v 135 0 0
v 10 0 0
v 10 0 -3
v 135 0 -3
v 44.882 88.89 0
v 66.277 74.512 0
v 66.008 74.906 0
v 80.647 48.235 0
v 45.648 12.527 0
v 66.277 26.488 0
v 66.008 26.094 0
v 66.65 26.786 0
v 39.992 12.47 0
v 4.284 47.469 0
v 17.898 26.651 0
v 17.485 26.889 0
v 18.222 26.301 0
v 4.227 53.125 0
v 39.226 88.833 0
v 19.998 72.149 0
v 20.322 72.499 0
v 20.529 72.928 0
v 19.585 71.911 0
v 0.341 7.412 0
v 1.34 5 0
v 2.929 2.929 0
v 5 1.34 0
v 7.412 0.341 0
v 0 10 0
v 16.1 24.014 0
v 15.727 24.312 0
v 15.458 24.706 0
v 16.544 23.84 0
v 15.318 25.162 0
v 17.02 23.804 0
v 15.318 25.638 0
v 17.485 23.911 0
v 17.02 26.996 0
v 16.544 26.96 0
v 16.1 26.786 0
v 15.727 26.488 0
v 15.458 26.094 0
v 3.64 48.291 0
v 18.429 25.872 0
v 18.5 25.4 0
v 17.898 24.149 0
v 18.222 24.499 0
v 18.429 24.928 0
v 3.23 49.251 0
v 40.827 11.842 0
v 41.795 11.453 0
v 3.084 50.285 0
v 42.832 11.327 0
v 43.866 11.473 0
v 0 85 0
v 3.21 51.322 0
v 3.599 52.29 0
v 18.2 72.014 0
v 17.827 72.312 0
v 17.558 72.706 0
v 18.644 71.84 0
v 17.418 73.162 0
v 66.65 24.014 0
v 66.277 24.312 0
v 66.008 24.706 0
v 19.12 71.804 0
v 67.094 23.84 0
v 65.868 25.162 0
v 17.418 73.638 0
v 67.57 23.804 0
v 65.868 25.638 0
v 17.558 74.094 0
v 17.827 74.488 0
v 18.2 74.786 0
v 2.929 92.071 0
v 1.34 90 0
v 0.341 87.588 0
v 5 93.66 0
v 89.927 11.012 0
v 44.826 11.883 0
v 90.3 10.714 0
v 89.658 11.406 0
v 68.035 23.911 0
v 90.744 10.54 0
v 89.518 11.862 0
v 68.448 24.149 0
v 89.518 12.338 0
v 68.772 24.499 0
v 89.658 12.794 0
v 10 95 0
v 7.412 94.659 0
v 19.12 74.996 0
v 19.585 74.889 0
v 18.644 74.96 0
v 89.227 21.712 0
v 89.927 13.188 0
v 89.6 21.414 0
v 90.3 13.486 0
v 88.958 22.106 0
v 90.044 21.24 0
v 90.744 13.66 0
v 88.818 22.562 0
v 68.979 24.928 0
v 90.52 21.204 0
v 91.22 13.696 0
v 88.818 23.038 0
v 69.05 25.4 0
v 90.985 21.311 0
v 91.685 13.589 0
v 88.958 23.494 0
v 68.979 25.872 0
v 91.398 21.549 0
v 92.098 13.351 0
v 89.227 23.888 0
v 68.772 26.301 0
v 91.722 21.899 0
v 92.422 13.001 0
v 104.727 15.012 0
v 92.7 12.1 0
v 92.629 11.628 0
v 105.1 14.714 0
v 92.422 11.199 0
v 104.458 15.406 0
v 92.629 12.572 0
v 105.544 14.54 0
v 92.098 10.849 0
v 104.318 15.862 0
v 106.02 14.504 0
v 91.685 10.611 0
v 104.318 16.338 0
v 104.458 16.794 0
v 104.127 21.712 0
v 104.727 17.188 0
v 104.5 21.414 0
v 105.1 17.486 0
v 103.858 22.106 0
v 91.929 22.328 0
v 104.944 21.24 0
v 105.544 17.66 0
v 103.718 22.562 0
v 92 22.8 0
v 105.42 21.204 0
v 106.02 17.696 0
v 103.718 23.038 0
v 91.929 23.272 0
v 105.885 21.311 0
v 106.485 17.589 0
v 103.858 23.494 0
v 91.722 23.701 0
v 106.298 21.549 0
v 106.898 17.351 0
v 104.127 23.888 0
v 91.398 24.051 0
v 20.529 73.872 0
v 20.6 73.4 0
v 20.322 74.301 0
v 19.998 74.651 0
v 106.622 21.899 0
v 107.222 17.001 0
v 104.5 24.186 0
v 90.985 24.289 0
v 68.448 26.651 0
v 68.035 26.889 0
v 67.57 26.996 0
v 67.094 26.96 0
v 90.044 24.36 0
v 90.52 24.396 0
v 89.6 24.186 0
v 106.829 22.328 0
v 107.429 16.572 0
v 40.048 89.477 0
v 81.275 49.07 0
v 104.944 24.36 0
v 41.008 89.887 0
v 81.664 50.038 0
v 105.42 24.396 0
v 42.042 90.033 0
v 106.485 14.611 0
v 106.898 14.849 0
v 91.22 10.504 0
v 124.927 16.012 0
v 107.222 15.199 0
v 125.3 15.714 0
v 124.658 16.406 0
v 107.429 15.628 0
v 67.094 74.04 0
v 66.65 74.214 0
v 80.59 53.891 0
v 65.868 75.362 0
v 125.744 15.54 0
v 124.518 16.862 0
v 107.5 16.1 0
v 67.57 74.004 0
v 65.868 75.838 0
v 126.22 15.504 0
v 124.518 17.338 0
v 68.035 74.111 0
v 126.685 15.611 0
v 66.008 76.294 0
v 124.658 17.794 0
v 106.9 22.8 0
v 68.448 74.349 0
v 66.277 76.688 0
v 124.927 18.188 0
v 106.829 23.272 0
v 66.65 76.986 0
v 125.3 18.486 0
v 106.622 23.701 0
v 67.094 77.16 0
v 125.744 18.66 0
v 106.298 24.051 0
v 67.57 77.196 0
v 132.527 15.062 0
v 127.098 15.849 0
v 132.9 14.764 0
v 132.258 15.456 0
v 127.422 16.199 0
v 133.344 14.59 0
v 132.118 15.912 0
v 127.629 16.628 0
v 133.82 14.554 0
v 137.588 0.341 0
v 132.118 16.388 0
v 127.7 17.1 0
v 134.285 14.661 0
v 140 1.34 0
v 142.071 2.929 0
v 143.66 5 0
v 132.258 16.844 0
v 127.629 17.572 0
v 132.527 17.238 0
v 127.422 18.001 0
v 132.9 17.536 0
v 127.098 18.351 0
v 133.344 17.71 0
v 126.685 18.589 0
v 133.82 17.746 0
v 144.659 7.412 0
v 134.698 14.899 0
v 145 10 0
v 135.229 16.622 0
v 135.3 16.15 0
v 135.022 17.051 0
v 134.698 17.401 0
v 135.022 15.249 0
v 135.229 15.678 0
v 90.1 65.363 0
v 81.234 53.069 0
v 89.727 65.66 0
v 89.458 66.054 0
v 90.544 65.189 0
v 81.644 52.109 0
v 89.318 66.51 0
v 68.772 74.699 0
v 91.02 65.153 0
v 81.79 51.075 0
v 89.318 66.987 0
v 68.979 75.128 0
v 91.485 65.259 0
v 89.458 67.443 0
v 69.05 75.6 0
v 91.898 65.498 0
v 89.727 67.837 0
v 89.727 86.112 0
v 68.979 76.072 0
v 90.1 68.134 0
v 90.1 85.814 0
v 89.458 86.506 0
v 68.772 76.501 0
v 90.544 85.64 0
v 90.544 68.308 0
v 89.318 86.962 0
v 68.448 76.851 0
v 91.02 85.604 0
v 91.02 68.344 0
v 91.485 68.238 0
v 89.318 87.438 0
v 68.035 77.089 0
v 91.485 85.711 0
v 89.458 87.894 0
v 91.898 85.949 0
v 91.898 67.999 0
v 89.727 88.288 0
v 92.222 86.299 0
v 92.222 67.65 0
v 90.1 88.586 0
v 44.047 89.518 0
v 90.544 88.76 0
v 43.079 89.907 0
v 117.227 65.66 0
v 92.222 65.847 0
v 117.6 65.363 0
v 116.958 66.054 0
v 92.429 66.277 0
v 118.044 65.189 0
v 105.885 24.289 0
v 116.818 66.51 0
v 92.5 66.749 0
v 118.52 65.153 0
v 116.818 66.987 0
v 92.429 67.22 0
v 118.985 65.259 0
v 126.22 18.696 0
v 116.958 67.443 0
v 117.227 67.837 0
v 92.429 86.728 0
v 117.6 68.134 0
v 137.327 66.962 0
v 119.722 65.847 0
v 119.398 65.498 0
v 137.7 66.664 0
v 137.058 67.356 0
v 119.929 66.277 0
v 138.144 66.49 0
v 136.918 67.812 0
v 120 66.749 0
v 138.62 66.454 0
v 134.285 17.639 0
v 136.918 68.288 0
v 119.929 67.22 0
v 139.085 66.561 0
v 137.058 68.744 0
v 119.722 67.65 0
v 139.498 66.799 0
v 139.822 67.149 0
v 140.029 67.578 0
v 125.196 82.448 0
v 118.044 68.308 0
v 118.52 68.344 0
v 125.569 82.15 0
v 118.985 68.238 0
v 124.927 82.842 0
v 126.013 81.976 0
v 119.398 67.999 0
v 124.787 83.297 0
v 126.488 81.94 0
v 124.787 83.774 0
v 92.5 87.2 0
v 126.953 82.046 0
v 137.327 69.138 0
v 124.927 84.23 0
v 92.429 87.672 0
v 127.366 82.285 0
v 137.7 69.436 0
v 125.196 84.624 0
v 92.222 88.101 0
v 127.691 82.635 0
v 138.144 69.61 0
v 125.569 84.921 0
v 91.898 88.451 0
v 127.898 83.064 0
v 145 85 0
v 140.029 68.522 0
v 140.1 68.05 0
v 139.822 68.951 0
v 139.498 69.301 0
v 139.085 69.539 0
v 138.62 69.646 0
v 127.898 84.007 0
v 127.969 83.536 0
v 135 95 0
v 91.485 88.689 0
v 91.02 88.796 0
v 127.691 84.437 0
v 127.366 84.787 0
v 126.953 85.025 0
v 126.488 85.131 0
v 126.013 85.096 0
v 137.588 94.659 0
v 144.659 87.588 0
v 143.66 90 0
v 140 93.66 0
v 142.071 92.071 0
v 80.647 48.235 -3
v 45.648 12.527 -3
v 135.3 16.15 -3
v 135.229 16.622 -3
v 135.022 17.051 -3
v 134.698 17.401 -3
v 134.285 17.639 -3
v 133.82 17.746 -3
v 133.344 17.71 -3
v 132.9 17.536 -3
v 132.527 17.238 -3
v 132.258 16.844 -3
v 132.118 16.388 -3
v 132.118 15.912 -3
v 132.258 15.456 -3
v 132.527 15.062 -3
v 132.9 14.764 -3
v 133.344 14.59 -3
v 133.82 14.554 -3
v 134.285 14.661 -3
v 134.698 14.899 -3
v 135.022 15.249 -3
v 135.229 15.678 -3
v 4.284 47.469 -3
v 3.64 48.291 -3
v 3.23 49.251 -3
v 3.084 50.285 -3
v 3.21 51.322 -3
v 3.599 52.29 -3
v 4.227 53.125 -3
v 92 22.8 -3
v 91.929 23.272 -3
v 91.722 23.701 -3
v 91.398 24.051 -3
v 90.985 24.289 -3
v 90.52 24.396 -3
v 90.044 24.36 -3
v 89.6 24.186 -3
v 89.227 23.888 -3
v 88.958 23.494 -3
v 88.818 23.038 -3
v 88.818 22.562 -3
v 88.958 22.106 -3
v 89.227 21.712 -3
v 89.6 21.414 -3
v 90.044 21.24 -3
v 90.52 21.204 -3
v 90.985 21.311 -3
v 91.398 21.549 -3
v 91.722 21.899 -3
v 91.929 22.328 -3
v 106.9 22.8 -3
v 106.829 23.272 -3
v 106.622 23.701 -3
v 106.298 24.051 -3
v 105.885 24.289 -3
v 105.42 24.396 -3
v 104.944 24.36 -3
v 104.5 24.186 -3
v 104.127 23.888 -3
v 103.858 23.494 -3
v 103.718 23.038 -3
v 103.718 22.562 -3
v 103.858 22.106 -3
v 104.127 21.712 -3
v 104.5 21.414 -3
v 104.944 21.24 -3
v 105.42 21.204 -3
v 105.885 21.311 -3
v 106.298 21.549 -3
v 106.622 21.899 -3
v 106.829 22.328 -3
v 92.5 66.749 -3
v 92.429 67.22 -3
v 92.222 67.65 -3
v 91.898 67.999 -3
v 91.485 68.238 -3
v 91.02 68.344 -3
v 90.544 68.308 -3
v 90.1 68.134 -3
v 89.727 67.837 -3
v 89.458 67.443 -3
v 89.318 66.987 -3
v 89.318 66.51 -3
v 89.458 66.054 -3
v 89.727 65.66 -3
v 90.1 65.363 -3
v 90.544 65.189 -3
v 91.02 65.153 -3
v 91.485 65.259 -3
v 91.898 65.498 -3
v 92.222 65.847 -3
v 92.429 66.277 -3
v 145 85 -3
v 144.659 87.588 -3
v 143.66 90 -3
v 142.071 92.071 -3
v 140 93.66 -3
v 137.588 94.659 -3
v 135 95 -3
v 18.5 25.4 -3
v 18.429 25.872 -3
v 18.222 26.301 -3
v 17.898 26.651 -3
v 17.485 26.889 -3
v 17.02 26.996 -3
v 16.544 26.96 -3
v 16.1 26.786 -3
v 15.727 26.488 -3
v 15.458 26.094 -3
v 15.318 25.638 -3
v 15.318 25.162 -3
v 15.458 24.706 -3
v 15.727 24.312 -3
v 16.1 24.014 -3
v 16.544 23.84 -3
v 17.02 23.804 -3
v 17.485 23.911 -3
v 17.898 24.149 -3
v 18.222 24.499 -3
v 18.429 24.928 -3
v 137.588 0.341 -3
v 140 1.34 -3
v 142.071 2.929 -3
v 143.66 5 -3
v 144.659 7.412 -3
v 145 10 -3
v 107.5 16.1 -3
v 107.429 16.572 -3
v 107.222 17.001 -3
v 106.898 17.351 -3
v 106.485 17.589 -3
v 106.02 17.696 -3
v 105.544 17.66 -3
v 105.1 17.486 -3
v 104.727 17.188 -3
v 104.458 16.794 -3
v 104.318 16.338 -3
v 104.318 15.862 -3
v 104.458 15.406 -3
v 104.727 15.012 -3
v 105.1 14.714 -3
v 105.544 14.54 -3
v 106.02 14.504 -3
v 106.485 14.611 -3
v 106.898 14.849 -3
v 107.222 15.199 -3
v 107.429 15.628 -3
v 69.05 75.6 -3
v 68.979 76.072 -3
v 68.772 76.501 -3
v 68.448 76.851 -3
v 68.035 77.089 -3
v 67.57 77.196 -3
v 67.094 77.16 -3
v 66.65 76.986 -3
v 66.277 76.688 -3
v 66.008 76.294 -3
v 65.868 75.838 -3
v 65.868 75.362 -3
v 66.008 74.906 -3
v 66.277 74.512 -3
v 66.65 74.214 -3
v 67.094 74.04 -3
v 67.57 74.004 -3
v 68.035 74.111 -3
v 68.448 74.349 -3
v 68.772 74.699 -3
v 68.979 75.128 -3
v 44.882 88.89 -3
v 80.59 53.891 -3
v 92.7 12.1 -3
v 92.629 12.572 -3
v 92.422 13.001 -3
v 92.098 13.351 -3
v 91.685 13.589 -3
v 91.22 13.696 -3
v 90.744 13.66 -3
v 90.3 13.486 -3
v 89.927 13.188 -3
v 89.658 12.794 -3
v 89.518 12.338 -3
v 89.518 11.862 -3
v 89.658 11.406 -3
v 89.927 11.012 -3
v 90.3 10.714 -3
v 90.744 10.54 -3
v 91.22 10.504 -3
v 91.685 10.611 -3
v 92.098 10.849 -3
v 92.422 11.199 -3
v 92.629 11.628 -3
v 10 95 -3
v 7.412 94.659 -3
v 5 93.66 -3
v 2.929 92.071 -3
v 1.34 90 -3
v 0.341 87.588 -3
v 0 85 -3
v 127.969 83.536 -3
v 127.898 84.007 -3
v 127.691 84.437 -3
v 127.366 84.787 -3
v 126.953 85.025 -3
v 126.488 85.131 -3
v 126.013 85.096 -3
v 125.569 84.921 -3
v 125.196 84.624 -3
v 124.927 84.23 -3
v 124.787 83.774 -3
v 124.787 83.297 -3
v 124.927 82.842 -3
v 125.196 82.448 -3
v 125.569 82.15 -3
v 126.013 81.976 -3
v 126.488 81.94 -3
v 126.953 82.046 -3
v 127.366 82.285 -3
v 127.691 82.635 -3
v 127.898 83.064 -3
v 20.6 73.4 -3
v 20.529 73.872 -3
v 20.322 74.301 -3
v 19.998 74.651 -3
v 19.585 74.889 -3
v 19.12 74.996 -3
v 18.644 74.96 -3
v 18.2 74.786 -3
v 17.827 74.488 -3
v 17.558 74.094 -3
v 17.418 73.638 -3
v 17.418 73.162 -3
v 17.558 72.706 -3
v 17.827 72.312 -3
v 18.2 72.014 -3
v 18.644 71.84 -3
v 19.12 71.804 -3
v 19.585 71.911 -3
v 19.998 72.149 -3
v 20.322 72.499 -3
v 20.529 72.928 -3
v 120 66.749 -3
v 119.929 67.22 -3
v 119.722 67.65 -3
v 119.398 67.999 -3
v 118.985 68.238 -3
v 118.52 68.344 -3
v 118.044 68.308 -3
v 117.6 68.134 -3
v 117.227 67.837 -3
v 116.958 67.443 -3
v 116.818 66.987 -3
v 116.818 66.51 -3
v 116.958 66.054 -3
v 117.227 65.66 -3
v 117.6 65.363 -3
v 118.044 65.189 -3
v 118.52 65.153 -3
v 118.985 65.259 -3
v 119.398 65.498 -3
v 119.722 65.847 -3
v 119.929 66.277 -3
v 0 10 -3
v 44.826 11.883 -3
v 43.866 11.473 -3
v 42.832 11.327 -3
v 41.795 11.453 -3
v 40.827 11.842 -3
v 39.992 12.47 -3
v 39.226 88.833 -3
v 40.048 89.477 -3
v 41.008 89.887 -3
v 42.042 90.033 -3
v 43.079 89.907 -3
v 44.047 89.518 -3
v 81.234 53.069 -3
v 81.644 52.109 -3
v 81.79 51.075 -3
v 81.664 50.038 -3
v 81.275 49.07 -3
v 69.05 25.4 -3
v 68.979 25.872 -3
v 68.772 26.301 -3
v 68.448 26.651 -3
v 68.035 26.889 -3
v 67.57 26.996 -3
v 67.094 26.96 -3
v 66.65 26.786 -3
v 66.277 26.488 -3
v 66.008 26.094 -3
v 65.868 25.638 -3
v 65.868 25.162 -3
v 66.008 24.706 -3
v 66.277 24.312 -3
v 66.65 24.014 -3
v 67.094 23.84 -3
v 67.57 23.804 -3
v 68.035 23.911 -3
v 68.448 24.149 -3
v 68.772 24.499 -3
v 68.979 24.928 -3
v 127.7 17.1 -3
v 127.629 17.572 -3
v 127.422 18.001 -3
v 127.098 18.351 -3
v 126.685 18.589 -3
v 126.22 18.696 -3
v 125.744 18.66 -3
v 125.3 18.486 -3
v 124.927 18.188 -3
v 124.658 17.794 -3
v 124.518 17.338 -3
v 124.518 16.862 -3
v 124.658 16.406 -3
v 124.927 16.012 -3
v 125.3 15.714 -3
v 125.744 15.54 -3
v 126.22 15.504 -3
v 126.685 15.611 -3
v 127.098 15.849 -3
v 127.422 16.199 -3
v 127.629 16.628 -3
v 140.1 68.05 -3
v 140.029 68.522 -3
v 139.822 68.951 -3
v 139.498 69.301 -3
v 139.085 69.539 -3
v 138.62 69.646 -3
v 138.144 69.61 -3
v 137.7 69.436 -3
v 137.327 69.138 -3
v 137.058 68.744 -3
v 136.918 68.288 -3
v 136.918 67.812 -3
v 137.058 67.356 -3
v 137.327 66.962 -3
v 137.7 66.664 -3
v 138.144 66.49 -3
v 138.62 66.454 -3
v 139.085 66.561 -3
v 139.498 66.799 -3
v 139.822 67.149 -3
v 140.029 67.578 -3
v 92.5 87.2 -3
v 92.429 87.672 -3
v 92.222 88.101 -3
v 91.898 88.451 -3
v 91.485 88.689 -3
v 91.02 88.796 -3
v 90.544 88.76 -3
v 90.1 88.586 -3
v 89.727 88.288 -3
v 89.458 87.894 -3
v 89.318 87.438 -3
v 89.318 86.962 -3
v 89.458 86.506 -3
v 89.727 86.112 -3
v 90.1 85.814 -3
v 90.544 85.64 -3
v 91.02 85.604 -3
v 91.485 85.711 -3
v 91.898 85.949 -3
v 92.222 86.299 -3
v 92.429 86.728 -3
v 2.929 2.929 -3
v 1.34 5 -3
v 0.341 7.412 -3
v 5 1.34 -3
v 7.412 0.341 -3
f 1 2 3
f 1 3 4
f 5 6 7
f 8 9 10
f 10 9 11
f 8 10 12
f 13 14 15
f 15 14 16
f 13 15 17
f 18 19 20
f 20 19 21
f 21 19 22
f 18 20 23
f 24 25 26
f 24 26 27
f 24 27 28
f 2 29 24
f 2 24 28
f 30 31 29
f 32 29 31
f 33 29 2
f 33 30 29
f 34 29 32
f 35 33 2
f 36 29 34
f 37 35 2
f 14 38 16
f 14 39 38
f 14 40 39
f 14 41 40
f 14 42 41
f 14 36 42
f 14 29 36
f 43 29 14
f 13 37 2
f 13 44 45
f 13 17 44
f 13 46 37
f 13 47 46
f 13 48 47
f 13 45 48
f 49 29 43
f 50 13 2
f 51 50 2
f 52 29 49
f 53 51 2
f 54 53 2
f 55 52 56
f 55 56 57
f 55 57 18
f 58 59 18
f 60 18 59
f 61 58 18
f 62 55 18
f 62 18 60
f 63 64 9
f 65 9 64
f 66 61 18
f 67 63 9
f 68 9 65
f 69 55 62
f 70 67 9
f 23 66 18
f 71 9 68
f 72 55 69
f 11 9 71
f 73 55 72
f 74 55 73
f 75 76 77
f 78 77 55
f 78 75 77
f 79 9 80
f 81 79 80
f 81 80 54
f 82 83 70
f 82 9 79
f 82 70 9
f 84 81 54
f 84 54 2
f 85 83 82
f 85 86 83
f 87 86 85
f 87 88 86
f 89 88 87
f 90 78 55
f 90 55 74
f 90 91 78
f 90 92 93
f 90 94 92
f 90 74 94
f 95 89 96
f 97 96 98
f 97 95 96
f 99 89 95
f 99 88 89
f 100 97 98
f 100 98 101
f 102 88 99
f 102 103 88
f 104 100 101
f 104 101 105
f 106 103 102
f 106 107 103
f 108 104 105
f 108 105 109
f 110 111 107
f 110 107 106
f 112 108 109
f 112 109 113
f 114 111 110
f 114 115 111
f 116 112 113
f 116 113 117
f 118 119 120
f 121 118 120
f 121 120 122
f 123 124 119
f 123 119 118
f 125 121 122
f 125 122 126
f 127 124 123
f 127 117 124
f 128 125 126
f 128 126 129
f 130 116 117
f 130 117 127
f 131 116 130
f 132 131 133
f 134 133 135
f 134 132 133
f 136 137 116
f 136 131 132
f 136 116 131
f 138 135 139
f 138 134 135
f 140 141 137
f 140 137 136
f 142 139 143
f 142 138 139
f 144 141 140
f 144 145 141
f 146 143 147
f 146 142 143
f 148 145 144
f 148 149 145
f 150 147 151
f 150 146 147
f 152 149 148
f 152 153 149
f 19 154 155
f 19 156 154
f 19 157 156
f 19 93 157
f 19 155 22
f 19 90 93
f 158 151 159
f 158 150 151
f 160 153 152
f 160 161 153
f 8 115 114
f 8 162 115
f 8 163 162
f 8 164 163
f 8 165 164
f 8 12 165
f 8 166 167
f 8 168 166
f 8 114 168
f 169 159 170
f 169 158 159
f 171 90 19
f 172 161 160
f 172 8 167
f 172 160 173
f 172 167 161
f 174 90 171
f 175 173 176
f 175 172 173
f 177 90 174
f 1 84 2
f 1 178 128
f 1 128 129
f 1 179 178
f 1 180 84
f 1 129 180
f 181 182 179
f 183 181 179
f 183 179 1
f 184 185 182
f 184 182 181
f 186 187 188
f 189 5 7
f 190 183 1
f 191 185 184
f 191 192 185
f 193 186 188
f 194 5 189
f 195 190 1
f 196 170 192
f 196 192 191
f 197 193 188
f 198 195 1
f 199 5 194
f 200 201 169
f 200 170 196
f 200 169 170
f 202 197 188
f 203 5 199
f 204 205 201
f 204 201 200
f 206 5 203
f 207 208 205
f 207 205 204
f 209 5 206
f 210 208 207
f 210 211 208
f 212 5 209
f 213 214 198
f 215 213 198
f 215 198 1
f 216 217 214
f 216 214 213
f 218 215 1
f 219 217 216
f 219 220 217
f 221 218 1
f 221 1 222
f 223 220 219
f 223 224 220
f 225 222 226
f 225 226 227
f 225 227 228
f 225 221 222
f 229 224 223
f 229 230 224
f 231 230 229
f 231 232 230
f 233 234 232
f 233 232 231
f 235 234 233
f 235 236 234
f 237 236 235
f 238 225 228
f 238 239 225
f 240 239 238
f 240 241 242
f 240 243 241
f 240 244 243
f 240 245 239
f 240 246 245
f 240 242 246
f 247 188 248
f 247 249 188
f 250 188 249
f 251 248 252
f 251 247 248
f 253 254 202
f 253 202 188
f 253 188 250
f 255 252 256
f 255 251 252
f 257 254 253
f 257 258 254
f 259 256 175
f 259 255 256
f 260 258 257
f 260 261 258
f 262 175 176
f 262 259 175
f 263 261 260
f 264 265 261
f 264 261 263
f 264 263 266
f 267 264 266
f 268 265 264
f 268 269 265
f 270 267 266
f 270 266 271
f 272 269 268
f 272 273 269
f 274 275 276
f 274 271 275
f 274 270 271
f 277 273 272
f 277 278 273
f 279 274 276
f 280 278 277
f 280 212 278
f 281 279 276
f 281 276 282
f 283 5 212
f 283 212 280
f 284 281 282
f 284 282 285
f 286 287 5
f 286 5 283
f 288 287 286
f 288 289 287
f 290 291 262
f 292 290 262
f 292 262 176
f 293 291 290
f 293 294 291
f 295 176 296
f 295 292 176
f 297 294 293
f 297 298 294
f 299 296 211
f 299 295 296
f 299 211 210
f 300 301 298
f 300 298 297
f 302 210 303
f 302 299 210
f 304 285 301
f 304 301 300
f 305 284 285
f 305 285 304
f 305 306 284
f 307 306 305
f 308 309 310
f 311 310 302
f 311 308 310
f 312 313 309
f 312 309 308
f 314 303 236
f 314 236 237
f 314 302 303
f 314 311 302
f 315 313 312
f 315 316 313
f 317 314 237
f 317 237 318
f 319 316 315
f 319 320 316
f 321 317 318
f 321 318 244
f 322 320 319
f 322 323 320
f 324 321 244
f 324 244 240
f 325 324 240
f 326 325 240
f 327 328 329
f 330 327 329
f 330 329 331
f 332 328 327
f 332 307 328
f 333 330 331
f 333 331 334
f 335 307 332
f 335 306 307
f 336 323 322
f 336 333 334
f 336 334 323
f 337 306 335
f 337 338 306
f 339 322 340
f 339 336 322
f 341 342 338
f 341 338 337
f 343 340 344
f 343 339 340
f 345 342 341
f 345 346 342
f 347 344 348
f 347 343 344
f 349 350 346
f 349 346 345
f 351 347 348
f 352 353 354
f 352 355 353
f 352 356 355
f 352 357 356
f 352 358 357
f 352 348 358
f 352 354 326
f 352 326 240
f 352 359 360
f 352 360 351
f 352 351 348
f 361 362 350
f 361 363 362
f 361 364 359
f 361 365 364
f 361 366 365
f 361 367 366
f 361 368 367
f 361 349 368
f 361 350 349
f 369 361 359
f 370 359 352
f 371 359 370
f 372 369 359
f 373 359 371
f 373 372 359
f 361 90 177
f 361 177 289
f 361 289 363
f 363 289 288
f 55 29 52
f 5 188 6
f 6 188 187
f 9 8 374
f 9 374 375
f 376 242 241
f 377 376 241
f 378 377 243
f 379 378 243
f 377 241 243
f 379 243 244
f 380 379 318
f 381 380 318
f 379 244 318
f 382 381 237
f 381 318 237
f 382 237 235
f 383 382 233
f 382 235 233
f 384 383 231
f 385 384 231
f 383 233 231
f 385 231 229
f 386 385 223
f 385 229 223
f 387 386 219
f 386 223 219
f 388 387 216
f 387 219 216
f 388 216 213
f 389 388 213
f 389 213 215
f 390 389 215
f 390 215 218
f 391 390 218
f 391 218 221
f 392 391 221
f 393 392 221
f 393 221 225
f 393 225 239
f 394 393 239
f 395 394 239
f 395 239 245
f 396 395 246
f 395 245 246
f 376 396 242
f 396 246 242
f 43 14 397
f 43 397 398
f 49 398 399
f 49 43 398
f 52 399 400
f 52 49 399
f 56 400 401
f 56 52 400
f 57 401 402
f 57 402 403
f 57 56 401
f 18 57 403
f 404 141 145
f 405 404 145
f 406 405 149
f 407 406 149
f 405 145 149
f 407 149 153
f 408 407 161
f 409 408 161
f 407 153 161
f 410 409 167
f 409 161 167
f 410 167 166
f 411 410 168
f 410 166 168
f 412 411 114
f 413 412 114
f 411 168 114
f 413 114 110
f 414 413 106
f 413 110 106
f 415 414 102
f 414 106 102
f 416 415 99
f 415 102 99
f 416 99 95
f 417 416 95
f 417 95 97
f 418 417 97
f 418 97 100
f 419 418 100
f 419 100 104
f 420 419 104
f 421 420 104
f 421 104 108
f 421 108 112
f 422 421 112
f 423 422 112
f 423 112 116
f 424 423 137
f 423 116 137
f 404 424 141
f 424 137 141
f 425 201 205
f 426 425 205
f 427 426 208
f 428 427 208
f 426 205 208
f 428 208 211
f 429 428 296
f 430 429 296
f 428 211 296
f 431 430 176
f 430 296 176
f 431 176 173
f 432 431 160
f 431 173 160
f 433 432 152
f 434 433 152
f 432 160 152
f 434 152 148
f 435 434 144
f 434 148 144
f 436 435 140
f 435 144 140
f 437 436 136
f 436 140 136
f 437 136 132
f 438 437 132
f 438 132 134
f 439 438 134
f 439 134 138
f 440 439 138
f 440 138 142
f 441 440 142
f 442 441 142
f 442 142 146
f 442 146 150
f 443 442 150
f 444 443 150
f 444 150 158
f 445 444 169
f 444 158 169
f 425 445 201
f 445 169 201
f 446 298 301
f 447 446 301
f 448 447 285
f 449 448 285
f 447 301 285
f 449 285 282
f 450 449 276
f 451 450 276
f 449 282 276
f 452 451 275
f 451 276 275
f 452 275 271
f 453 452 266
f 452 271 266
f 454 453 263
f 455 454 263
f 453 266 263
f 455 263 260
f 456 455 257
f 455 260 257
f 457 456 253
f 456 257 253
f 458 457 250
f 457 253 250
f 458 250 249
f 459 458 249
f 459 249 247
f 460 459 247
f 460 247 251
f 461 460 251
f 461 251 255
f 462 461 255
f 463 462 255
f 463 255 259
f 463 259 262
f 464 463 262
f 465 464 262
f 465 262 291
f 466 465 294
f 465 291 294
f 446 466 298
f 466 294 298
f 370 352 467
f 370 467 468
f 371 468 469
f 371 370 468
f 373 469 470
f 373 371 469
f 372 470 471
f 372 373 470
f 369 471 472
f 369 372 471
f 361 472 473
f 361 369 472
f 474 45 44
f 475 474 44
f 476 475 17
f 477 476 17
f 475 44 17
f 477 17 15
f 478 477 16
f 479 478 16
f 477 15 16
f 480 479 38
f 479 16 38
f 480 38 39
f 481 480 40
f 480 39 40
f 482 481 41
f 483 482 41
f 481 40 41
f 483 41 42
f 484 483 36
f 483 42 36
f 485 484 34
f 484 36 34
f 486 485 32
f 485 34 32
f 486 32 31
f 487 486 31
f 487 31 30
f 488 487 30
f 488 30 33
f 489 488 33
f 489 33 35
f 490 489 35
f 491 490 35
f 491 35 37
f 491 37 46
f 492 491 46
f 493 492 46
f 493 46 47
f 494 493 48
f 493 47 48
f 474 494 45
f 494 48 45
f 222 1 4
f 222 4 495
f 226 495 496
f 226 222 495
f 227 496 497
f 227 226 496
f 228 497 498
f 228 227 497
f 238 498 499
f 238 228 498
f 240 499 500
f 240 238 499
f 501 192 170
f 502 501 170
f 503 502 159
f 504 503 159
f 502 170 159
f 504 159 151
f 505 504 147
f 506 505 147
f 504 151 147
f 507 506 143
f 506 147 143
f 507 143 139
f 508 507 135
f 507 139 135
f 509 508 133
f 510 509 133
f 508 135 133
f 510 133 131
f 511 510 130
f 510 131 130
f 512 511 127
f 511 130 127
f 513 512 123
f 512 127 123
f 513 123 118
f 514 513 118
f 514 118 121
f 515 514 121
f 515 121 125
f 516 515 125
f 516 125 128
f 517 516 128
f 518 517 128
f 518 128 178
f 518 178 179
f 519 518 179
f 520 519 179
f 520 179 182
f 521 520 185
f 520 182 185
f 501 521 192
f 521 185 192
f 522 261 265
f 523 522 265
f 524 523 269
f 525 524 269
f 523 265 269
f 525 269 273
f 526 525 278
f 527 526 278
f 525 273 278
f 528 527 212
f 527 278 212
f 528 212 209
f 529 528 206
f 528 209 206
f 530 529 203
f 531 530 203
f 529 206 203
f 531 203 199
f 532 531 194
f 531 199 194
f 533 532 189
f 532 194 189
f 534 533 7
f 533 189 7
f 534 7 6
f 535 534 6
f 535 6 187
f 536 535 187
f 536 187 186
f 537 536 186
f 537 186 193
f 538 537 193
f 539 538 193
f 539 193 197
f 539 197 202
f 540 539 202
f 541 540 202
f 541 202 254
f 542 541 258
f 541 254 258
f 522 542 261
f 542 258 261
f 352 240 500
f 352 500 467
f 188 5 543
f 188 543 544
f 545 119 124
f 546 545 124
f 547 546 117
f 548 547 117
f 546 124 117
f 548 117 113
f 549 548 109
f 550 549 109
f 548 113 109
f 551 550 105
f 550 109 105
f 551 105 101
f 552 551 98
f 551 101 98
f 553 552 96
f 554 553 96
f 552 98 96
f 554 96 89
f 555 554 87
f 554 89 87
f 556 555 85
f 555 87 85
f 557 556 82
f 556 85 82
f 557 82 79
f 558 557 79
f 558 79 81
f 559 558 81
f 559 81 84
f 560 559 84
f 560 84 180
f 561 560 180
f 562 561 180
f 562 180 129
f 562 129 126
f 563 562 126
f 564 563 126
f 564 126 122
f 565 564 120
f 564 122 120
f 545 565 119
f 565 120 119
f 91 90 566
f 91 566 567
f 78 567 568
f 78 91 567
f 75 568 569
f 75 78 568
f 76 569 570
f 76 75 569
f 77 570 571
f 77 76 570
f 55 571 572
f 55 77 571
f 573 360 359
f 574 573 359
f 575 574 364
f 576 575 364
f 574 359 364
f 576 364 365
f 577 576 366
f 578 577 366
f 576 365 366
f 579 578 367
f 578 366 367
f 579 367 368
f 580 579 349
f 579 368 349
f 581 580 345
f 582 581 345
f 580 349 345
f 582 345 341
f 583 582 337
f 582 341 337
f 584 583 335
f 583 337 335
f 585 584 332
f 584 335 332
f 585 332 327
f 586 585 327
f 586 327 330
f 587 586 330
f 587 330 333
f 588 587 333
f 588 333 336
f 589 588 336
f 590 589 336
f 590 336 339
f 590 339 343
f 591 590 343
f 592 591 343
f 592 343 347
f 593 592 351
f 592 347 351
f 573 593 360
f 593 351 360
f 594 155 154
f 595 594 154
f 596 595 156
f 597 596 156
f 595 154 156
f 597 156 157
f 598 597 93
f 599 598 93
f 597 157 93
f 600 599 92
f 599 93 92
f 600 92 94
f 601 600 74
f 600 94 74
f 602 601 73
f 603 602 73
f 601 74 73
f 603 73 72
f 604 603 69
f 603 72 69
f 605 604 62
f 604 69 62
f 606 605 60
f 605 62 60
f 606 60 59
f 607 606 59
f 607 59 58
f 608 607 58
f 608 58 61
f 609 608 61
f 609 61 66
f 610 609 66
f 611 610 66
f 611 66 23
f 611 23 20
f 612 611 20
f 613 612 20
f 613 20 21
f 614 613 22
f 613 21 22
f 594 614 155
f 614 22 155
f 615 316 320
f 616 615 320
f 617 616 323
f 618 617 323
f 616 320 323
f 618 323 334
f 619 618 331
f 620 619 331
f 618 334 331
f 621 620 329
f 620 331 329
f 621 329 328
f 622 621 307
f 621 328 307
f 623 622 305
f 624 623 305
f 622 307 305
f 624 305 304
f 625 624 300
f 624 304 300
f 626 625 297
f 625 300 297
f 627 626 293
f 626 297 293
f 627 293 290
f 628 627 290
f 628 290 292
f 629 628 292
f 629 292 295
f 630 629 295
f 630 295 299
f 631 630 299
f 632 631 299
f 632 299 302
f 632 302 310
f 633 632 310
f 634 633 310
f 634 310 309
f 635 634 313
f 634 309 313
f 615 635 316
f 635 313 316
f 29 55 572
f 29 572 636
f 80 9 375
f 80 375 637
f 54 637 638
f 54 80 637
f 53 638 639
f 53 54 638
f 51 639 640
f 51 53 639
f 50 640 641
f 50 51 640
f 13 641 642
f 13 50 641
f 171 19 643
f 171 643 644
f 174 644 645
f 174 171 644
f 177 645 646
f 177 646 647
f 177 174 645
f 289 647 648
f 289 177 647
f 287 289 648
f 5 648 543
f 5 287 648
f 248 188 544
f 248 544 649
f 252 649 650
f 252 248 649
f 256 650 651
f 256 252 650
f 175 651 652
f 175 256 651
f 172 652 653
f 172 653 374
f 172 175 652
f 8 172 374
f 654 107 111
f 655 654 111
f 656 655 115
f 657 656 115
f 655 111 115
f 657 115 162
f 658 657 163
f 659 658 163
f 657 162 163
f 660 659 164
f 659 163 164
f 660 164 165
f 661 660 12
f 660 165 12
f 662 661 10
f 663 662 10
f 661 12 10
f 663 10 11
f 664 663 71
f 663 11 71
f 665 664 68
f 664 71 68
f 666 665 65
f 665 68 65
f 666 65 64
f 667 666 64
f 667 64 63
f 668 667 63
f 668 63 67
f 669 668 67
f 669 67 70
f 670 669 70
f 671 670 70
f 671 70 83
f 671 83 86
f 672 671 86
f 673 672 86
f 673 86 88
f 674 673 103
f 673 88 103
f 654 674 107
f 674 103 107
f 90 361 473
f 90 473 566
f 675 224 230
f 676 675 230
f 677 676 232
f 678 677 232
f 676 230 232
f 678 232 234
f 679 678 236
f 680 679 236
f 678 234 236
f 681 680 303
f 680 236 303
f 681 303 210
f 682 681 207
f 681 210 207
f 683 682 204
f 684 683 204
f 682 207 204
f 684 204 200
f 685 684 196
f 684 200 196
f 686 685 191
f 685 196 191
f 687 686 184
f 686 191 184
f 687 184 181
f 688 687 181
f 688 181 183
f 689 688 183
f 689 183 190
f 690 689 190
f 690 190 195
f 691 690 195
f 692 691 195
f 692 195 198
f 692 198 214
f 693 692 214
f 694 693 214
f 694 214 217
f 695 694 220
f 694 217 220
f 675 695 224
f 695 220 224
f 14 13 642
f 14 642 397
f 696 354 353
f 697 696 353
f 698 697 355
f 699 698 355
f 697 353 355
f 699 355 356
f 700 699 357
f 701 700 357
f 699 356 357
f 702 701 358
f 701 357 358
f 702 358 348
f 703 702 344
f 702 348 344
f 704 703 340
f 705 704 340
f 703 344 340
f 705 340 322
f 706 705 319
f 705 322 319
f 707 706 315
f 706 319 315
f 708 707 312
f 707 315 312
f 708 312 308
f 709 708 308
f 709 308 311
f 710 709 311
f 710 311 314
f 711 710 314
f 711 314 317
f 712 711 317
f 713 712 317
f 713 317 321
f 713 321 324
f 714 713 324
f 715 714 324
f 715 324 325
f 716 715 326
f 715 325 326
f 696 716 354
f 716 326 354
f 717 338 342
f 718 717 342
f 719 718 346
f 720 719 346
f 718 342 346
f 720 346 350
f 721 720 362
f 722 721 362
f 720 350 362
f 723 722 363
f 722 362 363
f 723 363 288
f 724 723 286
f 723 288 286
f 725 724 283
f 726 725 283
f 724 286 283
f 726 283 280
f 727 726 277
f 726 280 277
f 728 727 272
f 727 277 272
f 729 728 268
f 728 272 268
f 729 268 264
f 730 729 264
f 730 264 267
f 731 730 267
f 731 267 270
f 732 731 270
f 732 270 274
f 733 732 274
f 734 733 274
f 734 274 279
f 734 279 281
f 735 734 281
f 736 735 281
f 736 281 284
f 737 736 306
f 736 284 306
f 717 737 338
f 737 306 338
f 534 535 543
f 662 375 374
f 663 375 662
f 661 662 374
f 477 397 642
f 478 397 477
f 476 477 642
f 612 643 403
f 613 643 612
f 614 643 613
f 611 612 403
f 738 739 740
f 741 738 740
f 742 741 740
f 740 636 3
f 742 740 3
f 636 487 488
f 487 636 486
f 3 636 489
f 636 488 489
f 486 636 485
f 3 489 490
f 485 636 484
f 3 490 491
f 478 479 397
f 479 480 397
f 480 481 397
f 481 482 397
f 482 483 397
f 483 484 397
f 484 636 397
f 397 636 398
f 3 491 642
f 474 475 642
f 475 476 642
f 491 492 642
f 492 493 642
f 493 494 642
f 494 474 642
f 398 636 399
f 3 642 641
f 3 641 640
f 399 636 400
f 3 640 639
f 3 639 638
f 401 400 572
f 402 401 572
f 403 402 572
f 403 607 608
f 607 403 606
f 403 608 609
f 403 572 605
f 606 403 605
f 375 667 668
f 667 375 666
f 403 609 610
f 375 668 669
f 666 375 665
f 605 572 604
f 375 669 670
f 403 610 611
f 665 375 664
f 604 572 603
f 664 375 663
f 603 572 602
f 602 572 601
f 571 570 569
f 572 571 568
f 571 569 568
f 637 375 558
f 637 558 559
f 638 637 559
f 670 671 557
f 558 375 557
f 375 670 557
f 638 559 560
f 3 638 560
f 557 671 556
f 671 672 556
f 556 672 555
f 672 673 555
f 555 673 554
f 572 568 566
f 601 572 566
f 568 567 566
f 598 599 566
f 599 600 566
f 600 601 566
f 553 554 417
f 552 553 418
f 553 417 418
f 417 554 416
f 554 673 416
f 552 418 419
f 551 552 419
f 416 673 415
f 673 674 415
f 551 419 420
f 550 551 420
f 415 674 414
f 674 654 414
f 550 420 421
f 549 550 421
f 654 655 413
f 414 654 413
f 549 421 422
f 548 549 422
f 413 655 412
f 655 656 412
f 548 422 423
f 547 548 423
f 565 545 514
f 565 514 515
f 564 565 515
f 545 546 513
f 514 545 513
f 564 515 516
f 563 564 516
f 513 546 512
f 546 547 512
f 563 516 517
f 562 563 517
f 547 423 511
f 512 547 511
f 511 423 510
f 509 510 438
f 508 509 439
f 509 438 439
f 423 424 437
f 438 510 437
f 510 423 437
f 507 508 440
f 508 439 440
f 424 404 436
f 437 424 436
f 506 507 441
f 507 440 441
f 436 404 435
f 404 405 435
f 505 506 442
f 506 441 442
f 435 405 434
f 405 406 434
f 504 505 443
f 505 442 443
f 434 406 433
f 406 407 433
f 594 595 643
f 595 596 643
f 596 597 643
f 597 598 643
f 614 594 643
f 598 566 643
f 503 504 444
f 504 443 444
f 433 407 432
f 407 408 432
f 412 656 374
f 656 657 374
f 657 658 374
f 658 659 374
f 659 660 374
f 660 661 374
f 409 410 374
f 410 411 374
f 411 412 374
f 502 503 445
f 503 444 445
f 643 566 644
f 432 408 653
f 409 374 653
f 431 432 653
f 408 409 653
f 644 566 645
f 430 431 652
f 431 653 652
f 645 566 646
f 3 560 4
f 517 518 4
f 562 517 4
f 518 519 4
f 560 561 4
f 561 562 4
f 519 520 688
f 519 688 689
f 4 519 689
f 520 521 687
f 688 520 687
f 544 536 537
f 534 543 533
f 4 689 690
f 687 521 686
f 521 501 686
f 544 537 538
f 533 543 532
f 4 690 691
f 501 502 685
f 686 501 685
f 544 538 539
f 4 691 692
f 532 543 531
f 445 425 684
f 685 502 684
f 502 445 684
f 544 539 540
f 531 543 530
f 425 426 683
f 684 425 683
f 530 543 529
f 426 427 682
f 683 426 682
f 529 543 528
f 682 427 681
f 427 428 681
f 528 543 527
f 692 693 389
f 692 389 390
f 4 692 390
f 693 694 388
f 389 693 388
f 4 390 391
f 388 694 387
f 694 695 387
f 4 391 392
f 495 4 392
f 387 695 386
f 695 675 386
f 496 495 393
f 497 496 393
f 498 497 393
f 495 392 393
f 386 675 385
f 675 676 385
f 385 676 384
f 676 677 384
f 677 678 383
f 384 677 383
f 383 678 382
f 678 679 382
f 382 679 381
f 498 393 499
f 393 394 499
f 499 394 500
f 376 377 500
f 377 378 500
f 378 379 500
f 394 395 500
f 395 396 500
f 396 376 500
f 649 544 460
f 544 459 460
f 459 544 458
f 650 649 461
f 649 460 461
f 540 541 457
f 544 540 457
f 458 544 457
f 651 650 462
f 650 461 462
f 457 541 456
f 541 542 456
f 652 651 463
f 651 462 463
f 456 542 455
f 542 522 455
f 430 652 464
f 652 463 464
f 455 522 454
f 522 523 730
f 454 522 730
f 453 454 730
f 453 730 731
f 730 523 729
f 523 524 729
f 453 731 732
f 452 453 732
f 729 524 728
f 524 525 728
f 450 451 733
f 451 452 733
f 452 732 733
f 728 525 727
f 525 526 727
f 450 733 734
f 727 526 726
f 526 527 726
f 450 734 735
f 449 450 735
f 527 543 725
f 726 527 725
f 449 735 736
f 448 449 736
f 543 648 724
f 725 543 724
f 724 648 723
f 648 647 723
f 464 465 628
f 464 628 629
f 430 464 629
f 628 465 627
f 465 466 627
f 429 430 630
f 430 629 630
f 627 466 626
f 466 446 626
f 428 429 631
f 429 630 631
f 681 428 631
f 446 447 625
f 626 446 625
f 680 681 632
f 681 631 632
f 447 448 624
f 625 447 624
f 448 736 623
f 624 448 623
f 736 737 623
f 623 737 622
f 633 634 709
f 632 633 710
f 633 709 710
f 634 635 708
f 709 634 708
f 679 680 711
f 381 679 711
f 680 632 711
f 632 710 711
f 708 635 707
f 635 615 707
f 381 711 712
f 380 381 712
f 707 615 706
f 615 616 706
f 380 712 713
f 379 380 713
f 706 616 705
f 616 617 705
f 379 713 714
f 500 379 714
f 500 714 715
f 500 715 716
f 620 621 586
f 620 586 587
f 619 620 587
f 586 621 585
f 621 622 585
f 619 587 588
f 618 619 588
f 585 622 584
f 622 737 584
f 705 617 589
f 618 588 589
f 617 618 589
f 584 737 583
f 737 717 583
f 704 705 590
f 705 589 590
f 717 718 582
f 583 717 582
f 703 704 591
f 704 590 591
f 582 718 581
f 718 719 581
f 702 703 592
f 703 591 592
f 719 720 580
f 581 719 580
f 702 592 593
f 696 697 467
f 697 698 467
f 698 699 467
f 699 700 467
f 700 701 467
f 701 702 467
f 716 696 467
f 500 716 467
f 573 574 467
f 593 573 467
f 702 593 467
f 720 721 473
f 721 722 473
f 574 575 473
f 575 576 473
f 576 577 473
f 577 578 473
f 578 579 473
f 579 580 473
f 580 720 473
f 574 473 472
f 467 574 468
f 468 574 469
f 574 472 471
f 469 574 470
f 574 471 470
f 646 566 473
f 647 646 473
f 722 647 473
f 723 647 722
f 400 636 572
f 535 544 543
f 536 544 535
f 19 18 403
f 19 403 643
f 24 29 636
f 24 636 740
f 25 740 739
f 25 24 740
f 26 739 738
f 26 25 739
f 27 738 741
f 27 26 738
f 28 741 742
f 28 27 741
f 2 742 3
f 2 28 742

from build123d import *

# Parameters (mm, degrees)
ESQUISSE1_R               = 1.6
T_LE_DE_BASE_PLI_E1_DEPTH = 3


# Sheet-metal steps are written as plain solids
with BuildPart() as part:
    # Esquisse1 → Tôle de base pliée1 (new body)
    with BuildSketch(Plane.XY):
        with BuildLine():
            Line((10, 0), (135, 0))
            ThreePointArc((135, 0), (142.071067812, 2.928932188), (145, 10))
            Line((145, 10), (145, 85))
            ThreePointArc((145, 85), (142.071067812, 92.071067812), (135, 95))
            Line((135, 95), (10, 95))
            ThreePointArc((10, 95), (2.928932188, 92.071067812), (0, 85))
            Line((0, 85), (0, 10))
            ThreePointArc((0, 10), (2.928932188, 2.928932188), (10, 0))
        make_face()
        with Locations((90.9, 87.2)):
            Circle(ESQUISSE1_R, mode=Mode.SUBTRACT)
        with Locations((126.368886423, 83.535840528)):
            Circle(ESQUISSE1_R, mode=Mode.SUBTRACT)
        with Locations((138.5, 68.05)):
            Circle(ESQUISSE1_R, mode=Mode.SUBTRACT)
        with Locations((118.4, 66.74856953)):
            Circle(ESQUISSE1_R, mode=Mode.SUBTRACT)
        with Locations((90.9, 66.74856953)):
            Circle(ESQUISSE1_R, mode=Mode.SUBTRACT)
        with Locations((126.1, 17.1)):
            Circle(ESQUISSE1_R, mode=Mode.SUBTRACT)
        with Locations((133.7, 16.15)):
            Circle(ESQUISSE1_R, mode=Mode.SUBTRACT)
        with Locations((105.3, 22.8)):
            Circle(ESQUISSE1_R, mode=Mode.SUBTRACT)
        with Locations((90.4, 22.8)):
            Circle(ESQUISSE1_R, mode=Mode.SUBTRACT)
        with Locations((91.1, 12.1)):
            Circle(ESQUISSE1_R, mode=Mode.SUBTRACT)
        with Locations((105.9, 16.1)):
            Circle(ESQUISSE1_R, mode=Mode.SUBTRACT)
        with Locations((67.45, 25.4)):
            Circle(ESQUISSE1_R, mode=Mode.SUBTRACT)
        with Locations((19, 73.4)):
            Circle(ESQUISSE1_R, mode=Mode.SUBTRACT)
        with Locations((16.9, 25.4)):
            Circle(ESQUISSE1_R, mode=Mode.SUBTRACT)
        with Locations((67.45, 75.6)):
            Circle(ESQUISSE1_R, mode=Mode.SUBTRACT)
        with BuildLine():
            Line((44.882149159, 88.890256032), (80.590443676, 53.891431727))
            ThreePointArc((80.590443676, 53.891431727), (81.790336387, 51.074901862), (80.647201293, 48.234862221))
            Line((80.647201293, 48.234862221), (45.648376988, 12.526567705))
            ThreePointArc((45.648376988, 12.526567705), (42.831847123, 11.326674993), (39.991807483, 12.469810088))
            Line((39.991807483, 12.469810088), (4.283512966, 47.468634392))
            ThreePointArc((4.283512966, 47.468634392), (3.083620254, 50.285164258), (4.226755349, 53.125203898))
            Line((4.226755349, 53.125203898), (39.225579653, 88.833498415))
            ThreePointArc((39.225579653, 88.833498415), (42.042109519, 90.033391126), (44.882149159, 88.890256032))
        make_face(mode=Mode.SUBTRACT)
    extrude(amount=-T_LE_DE_BASE_PLI_E1_DEPTH)


solid = part.part
